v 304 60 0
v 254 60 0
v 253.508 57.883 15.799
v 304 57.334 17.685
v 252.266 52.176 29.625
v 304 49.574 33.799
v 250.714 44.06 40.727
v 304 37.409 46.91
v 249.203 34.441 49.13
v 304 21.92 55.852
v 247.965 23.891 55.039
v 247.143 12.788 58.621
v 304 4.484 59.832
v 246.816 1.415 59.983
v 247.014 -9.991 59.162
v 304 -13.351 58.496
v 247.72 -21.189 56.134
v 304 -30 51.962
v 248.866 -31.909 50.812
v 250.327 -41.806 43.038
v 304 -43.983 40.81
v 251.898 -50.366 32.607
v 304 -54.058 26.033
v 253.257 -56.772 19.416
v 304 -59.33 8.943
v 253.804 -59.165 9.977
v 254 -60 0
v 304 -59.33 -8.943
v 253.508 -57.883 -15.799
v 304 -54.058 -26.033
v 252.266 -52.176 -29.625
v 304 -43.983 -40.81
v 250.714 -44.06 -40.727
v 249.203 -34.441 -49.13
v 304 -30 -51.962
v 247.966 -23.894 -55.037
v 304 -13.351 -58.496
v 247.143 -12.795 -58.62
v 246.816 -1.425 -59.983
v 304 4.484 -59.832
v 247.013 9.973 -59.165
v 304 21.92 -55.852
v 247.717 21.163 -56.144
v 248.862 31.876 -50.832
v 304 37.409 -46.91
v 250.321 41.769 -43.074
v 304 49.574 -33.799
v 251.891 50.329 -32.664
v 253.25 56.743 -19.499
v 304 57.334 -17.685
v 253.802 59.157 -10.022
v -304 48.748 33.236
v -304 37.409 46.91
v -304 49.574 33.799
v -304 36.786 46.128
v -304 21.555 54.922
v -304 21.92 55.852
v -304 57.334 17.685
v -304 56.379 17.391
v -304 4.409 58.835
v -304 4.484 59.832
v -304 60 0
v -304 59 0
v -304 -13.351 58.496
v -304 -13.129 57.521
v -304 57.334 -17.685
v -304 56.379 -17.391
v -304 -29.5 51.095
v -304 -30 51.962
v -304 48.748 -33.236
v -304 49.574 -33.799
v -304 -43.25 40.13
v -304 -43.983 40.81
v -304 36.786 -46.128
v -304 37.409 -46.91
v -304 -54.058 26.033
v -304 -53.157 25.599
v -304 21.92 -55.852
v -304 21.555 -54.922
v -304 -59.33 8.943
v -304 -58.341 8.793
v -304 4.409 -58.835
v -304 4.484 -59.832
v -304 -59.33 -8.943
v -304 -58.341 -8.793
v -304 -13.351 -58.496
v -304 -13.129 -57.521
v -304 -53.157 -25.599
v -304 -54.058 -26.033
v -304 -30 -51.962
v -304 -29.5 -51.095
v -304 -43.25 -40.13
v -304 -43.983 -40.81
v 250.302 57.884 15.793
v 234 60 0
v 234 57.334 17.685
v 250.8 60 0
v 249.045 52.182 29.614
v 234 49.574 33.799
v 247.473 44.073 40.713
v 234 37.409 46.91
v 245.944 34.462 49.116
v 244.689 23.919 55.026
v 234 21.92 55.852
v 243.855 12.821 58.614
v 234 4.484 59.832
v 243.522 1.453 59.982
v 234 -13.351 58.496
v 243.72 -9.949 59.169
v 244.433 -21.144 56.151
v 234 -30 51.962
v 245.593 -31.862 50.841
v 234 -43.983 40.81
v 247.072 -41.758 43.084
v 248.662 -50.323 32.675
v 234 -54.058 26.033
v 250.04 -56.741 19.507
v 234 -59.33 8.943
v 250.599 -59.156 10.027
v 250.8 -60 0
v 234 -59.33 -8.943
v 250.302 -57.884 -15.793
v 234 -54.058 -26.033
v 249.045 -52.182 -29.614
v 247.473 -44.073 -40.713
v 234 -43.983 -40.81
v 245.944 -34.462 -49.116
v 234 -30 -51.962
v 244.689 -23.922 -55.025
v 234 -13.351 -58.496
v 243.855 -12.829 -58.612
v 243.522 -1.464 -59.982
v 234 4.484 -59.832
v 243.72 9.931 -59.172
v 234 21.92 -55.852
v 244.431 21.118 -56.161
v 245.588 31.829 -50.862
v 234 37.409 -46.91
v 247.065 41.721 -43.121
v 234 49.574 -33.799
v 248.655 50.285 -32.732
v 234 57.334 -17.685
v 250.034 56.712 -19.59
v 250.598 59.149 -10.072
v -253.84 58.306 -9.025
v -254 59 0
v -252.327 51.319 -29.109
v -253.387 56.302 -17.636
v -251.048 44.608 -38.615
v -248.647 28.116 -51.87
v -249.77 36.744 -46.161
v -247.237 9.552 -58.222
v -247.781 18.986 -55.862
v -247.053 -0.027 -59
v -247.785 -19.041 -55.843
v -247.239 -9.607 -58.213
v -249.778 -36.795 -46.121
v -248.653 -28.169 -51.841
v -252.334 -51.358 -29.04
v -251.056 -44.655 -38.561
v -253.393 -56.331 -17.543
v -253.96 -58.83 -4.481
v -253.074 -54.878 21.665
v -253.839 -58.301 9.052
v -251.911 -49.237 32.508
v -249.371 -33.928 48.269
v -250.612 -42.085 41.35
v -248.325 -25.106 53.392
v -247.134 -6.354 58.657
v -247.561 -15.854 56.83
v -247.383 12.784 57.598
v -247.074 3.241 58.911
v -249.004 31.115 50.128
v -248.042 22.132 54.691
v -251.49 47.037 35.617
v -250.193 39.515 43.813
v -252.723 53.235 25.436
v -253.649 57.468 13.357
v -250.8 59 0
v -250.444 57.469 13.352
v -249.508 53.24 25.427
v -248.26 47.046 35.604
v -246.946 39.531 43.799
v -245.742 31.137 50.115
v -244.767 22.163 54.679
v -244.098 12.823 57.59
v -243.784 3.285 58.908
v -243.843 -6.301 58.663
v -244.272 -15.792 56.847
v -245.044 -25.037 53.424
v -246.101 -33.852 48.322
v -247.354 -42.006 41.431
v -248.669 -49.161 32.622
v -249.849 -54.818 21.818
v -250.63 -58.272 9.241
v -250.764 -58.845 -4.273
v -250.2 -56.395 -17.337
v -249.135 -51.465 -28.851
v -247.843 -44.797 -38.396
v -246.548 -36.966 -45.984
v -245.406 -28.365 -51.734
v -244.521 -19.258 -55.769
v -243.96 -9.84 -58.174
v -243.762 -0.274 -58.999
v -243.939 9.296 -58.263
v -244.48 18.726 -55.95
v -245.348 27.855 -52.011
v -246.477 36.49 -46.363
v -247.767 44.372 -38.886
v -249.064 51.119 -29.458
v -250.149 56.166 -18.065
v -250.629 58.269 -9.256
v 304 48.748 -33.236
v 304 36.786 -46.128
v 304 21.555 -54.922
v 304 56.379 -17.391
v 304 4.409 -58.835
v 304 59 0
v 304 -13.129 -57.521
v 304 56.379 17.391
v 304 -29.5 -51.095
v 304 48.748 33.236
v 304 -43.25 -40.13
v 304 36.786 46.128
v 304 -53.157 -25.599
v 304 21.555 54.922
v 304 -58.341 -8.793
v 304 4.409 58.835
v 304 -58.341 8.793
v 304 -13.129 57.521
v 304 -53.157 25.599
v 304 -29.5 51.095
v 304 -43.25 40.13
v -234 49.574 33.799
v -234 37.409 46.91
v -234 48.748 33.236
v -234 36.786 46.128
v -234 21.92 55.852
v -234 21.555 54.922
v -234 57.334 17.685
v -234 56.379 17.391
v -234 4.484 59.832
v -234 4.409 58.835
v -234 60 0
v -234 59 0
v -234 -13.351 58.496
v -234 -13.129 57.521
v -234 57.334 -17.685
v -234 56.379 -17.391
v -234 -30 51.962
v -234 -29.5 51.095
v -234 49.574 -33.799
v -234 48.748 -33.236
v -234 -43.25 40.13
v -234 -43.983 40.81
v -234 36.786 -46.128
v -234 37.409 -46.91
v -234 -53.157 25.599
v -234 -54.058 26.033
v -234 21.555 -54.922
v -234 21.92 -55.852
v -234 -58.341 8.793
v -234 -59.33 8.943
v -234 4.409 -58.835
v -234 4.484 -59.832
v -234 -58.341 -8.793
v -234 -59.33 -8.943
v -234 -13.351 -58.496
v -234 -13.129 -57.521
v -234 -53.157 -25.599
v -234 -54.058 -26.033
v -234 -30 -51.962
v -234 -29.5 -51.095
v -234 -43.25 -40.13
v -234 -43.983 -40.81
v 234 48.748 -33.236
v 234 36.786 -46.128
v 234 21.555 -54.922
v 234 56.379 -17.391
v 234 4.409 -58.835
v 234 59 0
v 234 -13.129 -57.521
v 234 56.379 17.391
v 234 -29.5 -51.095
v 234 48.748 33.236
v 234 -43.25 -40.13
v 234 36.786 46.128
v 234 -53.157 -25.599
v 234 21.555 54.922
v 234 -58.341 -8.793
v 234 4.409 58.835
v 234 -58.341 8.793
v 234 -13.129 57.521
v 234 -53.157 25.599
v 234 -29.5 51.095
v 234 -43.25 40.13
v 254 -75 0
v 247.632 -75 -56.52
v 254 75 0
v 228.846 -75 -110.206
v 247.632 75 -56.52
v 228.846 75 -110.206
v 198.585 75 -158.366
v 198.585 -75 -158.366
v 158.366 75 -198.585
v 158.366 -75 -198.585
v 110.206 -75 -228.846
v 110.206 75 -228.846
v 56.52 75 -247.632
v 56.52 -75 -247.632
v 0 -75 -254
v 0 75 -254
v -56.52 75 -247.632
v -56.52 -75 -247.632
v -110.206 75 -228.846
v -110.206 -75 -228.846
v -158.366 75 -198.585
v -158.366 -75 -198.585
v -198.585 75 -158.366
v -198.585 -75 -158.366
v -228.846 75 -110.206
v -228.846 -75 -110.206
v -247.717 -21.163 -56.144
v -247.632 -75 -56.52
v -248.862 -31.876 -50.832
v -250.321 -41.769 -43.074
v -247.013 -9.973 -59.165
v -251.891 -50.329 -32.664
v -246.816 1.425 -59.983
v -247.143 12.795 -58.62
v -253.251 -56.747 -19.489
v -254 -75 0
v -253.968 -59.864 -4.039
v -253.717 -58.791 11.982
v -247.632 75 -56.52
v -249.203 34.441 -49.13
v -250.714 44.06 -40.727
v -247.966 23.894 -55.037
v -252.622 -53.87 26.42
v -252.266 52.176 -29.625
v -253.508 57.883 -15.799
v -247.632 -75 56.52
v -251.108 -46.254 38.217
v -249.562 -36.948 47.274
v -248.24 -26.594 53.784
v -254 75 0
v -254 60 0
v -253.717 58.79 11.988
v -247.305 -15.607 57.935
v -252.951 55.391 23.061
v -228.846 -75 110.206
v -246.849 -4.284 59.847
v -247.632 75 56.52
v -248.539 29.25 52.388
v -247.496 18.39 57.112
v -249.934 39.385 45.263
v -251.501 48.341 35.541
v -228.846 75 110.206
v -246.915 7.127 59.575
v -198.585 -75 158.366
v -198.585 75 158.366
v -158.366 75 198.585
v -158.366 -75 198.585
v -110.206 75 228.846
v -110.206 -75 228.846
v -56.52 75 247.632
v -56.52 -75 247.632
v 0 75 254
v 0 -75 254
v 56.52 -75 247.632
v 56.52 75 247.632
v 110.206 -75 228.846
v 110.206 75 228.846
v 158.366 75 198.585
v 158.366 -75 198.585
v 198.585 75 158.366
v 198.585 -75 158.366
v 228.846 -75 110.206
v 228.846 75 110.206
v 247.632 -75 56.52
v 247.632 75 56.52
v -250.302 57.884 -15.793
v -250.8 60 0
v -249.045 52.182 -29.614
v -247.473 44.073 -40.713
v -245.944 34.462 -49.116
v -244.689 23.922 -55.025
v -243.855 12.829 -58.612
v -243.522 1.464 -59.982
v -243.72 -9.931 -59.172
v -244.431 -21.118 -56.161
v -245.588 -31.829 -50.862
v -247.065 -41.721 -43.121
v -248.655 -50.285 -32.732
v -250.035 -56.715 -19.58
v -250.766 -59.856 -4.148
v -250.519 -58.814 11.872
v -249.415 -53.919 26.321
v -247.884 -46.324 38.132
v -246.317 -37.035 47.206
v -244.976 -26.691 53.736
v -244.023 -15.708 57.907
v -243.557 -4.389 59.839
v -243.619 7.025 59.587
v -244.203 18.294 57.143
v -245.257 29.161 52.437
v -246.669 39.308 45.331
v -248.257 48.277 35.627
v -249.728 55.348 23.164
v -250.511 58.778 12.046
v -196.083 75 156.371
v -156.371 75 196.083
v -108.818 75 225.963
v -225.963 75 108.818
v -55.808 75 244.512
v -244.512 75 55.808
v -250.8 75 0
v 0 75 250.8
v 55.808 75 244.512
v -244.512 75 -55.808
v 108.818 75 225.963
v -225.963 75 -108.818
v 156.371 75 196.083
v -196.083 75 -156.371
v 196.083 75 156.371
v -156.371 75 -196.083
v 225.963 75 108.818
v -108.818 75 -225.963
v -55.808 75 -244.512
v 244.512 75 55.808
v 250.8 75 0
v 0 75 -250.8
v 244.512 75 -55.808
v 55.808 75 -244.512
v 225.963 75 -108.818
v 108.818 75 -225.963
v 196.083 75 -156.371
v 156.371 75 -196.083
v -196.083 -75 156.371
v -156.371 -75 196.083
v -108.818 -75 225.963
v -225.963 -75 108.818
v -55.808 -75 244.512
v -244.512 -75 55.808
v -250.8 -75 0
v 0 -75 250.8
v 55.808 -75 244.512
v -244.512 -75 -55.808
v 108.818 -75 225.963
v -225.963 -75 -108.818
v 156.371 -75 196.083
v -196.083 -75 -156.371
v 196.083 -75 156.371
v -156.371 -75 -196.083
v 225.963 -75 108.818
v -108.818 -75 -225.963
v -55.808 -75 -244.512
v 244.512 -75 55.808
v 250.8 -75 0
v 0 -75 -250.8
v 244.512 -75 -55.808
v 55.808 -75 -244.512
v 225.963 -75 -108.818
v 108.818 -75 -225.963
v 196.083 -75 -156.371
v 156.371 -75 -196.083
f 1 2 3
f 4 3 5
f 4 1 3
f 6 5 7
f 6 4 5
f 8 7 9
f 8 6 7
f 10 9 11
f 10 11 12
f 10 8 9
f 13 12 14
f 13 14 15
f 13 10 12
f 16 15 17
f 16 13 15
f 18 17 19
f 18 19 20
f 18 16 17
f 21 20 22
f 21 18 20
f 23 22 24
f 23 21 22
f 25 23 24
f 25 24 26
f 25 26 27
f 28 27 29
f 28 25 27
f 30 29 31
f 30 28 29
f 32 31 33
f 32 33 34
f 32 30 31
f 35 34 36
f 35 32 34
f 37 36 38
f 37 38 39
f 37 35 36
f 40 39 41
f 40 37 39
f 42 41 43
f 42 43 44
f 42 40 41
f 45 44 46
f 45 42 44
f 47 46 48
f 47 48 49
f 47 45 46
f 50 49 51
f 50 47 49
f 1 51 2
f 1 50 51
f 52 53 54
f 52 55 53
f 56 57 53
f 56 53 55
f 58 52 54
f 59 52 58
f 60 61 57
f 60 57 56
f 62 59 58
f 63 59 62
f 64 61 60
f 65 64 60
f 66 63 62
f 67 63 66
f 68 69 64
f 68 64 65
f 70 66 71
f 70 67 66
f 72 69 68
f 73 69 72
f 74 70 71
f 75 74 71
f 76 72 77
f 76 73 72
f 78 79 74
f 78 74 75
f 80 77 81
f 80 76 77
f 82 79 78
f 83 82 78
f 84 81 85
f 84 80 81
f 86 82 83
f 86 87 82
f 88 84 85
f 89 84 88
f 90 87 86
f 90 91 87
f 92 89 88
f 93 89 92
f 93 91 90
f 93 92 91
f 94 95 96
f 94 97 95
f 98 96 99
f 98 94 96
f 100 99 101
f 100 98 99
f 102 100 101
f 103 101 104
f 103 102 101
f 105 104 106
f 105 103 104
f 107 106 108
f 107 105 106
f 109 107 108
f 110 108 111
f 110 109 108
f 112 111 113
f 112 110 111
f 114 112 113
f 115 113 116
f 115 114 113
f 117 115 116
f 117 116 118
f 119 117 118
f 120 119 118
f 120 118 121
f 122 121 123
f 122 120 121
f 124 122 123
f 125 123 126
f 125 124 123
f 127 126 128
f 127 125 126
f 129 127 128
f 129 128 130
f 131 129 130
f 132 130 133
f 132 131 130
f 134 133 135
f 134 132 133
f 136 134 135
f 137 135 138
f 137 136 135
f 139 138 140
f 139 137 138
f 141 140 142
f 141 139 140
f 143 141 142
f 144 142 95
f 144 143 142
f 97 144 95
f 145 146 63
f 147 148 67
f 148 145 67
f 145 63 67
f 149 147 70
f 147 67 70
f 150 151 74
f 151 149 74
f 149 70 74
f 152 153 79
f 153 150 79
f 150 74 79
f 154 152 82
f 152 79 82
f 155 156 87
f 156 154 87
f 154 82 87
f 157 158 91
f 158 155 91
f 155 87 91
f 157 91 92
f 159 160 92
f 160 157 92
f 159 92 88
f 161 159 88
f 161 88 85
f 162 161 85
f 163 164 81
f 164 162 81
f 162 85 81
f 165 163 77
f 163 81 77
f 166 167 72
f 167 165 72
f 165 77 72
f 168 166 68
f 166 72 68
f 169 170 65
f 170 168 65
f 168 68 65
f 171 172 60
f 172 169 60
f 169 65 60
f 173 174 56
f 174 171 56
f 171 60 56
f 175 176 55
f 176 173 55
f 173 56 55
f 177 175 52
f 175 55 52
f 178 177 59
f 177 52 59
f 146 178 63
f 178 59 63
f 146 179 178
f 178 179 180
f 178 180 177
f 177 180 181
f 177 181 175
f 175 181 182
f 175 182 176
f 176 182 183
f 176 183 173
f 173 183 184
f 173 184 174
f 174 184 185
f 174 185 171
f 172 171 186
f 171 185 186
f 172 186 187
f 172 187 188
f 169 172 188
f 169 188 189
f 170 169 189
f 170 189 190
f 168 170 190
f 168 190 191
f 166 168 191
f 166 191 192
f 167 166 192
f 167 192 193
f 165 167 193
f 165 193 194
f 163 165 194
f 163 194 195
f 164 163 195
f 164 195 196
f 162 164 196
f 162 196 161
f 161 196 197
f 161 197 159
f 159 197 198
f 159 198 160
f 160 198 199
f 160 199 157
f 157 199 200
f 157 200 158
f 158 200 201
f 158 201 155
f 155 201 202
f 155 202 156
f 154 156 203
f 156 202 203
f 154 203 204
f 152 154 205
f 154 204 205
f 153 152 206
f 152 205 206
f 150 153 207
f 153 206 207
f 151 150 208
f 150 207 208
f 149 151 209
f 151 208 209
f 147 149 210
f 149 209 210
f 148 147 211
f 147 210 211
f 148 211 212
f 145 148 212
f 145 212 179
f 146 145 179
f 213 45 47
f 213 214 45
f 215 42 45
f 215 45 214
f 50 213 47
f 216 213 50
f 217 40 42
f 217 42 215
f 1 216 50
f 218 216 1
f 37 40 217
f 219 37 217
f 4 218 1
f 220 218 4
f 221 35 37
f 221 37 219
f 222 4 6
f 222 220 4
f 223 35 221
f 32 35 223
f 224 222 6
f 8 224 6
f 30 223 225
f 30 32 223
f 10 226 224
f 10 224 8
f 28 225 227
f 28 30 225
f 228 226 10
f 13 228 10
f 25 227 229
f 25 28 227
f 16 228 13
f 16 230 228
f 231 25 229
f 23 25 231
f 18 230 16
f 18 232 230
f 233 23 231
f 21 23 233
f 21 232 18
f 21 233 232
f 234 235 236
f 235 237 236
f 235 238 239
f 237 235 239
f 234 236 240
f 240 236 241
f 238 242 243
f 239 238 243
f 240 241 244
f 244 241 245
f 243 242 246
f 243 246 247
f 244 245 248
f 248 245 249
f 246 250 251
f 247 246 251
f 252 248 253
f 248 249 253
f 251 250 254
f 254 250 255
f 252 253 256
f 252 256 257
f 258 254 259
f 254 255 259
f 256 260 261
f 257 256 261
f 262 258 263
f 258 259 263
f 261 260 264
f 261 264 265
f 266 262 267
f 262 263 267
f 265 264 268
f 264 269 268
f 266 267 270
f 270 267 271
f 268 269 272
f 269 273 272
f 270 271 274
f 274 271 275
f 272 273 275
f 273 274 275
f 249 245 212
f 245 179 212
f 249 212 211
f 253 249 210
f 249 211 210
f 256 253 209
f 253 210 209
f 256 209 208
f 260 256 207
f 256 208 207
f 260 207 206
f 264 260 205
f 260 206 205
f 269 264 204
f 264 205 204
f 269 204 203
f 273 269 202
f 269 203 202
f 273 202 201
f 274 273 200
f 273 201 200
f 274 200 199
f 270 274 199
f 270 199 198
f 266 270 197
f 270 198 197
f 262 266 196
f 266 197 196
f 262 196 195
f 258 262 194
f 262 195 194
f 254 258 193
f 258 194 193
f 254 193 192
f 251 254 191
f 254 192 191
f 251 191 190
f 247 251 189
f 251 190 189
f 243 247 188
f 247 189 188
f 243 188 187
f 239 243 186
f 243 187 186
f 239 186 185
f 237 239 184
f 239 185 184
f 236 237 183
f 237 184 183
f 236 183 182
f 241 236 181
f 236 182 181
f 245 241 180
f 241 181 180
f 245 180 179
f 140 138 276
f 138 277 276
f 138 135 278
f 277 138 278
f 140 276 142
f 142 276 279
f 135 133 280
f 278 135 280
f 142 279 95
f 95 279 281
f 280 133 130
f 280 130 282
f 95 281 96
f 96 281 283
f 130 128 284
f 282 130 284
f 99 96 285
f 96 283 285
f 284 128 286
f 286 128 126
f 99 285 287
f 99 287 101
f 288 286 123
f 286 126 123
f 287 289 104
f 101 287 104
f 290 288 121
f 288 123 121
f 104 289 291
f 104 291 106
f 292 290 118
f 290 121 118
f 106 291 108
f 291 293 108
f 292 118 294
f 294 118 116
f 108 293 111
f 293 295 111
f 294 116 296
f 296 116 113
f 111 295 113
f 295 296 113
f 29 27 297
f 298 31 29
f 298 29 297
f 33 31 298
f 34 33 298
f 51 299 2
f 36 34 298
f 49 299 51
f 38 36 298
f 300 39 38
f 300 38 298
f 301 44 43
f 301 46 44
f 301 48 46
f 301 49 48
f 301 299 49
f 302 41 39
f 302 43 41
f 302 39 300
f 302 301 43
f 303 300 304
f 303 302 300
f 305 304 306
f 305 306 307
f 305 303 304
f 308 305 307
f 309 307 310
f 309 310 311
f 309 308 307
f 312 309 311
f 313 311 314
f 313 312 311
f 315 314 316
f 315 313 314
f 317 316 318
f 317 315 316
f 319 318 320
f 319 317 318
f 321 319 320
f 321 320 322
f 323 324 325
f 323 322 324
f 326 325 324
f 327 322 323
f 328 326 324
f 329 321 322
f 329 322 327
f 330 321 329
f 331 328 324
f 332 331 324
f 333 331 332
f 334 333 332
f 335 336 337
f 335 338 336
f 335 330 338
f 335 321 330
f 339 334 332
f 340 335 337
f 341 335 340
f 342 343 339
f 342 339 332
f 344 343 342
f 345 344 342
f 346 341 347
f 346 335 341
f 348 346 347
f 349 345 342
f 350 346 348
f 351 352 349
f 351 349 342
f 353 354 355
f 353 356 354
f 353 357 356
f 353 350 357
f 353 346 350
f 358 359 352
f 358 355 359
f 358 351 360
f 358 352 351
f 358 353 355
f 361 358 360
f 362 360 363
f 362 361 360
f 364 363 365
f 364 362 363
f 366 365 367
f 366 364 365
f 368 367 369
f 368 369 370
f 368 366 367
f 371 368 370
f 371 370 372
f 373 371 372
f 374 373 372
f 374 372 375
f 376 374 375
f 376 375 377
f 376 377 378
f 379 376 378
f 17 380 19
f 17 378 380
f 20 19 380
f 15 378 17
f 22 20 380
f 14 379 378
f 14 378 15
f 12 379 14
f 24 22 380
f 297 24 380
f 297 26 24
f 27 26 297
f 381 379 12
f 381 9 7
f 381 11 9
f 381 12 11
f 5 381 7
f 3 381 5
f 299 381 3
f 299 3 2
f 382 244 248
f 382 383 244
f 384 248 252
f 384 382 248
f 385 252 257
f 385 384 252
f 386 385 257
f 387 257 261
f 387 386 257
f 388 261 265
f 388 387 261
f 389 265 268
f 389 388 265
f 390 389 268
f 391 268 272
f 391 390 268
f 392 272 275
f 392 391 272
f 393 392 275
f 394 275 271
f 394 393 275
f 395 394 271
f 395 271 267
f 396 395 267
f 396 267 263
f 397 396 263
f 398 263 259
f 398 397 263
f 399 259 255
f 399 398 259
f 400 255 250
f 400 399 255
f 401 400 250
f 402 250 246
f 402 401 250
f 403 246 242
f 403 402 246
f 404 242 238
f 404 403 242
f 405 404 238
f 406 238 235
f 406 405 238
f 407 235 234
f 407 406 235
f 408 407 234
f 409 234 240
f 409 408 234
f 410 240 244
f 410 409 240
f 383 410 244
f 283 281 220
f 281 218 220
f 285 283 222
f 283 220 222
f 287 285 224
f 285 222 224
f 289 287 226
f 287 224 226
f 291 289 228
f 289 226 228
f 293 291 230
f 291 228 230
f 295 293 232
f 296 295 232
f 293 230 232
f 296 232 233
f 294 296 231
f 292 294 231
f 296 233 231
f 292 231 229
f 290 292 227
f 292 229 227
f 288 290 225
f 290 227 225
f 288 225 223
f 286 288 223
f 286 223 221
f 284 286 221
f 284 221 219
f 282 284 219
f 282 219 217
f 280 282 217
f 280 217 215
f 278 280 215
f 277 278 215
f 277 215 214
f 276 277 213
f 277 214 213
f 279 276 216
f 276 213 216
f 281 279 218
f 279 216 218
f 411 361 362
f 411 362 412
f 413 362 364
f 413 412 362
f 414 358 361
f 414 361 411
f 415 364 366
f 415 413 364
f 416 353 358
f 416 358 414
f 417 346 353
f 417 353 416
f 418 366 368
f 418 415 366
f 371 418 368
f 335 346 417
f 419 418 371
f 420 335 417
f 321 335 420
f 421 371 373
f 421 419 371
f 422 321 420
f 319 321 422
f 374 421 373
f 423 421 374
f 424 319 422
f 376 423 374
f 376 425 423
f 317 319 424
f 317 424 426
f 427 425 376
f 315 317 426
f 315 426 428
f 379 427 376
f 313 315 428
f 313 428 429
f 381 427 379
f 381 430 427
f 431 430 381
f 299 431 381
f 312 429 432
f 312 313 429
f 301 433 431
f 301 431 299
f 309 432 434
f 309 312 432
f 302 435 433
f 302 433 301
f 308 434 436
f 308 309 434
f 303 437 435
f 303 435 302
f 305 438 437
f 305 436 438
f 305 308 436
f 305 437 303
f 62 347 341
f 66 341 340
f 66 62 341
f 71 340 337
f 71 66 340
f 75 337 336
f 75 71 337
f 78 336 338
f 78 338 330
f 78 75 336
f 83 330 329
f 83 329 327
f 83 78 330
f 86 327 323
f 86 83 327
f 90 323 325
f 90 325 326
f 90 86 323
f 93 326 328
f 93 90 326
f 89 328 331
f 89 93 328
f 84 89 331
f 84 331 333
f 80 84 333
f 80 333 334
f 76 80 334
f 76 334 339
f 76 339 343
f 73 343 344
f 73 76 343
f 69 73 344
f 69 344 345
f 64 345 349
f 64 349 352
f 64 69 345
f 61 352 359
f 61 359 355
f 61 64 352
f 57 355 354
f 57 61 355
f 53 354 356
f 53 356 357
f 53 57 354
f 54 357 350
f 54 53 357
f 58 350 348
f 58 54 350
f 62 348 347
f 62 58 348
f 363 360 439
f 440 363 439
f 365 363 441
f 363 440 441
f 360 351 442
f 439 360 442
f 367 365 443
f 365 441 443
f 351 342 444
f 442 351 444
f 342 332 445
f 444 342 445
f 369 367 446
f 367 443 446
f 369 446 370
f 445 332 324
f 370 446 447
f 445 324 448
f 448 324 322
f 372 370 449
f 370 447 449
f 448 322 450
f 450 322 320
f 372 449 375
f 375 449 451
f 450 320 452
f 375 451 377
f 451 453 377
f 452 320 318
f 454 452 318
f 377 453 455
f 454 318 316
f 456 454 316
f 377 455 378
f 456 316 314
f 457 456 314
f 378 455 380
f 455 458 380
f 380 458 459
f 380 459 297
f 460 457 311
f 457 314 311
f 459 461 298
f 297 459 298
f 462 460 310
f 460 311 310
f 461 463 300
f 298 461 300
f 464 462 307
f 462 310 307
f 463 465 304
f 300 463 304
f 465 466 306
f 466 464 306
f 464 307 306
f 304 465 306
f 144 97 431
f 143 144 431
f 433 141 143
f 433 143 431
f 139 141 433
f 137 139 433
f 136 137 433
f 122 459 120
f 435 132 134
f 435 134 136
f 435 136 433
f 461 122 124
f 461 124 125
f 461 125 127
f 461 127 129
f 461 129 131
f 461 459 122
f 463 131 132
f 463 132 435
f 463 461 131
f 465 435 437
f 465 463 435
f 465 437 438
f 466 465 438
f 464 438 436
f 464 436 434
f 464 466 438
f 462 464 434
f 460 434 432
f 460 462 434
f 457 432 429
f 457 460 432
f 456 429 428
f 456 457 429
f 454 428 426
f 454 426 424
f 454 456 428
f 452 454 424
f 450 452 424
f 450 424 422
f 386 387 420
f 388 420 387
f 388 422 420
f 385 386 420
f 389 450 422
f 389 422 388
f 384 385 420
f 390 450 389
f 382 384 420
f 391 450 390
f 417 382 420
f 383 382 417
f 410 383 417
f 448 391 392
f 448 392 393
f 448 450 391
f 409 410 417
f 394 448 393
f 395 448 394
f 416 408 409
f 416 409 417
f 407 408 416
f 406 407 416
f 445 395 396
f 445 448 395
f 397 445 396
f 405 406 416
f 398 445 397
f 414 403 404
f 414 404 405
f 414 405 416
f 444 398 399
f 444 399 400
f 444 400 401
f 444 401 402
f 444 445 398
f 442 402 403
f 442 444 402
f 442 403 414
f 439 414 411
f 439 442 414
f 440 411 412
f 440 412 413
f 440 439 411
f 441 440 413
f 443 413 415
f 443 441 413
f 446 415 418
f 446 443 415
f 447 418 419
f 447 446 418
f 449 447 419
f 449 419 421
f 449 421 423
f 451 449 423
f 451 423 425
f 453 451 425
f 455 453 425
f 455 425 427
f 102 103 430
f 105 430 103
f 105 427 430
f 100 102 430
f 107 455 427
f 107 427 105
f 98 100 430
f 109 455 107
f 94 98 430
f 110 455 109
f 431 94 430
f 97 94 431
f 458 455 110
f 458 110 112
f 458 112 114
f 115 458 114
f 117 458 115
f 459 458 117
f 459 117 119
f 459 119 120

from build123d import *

# Parameters (mm, degrees)
SCHIZZO2_R                  = 254
SCHIZZO2_R_2                = 250.8
ESTRUSIONE_SOTTILE1_DEPTH   = 75
SWEEP_SOTTILE2_PROFILE_R    = 60
SWEEP_SOTTILE2_PROFILE_R_2  = 59
TAGLIO_ESTRUSIONE1_REACH    = 619.661
SCHIZZO26_R                 = 59
RIPETIZIONECIRCOLARE1_COUNT = 2


with BuildPart() as part:
    # Schizzo2 → Estrusione-Sottile1 (new, symmetric)
    with BuildSketch(Plane(origin=(0, 0, 0), x_dir=(1, 0, 0), z_dir=(0, 1, 0))):
        Circle(SCHIZZO2_R)
        Circle(SCHIZZO2_R_2, mode=Mode.SUBTRACT)
    extrude(amount=ESTRUSIONE_SOTTILE1_DEPTH, both=True)

    # Sweep-Sottile2: sweep along a path in Schizzo3
    with BuildLine(Plane.XY) as sweep_sottile2_path:
        Line((234, 0), (304, 0))
    # Sweep-Sottile2 profile (on start of the path) → Sweep-Sottile2 (sweep)
    with BuildSketch(Plane.YZ.offset(234)):
        Circle(SWEEP_SOTTILE2_PROFILE_R)
        Circle(SWEEP_SOTTILE2_PROFILE_R_2, mode=Mode.SUBTRACT)
    sweep_sottile2 = sweep(path=sweep_sottile2_path.line)

    # Schizzo26 → Taglio-Estrusione1 (cut, up to next)
    with BuildSketch(Plane(origin=(304, 0, 0), x_dir=(0, 0, -1), z_dir=(1, 0, 0)), mode=Mode.PRIVATE) as taglio_estrusione1_sk1:
        with Locations(Location((0, 0, 0), (0, 0, 90))):
            Circle(SCHIZZO26_R)
    taglio_estrusione1_tool1 = extrude(taglio_estrusione1_sk1.sketch, amount=-TAGLIO_ESTRUSIONE1_REACH, mode=Mode.PRIVATE) & part.part
    add(taglio_estrusione1_tool1.solids().sort_by_distance((304, 0, 0))[0], mode=Mode.SUBTRACT)
    add(taglio_estrusione1_tool1.solids().sort_by_distance((304, 0, 0))[1], mode=Mode.SUBTRACT)

    # RipetizioneCircolare1: Sweep-Sottile2 ×2 about axis
    ripetizionecircolare1_axis = Axis((0, 75, 0), (0, 1, 0))
    for i in range(1, RIPETIZIONECIRCOLARE1_COUNT):
        add(sweep_sottile2.rotate(ripetizionecircolare1_axis, i * 360 / RIPETIZIONECIRCOLARE1_COUNT))


solid = part.part
